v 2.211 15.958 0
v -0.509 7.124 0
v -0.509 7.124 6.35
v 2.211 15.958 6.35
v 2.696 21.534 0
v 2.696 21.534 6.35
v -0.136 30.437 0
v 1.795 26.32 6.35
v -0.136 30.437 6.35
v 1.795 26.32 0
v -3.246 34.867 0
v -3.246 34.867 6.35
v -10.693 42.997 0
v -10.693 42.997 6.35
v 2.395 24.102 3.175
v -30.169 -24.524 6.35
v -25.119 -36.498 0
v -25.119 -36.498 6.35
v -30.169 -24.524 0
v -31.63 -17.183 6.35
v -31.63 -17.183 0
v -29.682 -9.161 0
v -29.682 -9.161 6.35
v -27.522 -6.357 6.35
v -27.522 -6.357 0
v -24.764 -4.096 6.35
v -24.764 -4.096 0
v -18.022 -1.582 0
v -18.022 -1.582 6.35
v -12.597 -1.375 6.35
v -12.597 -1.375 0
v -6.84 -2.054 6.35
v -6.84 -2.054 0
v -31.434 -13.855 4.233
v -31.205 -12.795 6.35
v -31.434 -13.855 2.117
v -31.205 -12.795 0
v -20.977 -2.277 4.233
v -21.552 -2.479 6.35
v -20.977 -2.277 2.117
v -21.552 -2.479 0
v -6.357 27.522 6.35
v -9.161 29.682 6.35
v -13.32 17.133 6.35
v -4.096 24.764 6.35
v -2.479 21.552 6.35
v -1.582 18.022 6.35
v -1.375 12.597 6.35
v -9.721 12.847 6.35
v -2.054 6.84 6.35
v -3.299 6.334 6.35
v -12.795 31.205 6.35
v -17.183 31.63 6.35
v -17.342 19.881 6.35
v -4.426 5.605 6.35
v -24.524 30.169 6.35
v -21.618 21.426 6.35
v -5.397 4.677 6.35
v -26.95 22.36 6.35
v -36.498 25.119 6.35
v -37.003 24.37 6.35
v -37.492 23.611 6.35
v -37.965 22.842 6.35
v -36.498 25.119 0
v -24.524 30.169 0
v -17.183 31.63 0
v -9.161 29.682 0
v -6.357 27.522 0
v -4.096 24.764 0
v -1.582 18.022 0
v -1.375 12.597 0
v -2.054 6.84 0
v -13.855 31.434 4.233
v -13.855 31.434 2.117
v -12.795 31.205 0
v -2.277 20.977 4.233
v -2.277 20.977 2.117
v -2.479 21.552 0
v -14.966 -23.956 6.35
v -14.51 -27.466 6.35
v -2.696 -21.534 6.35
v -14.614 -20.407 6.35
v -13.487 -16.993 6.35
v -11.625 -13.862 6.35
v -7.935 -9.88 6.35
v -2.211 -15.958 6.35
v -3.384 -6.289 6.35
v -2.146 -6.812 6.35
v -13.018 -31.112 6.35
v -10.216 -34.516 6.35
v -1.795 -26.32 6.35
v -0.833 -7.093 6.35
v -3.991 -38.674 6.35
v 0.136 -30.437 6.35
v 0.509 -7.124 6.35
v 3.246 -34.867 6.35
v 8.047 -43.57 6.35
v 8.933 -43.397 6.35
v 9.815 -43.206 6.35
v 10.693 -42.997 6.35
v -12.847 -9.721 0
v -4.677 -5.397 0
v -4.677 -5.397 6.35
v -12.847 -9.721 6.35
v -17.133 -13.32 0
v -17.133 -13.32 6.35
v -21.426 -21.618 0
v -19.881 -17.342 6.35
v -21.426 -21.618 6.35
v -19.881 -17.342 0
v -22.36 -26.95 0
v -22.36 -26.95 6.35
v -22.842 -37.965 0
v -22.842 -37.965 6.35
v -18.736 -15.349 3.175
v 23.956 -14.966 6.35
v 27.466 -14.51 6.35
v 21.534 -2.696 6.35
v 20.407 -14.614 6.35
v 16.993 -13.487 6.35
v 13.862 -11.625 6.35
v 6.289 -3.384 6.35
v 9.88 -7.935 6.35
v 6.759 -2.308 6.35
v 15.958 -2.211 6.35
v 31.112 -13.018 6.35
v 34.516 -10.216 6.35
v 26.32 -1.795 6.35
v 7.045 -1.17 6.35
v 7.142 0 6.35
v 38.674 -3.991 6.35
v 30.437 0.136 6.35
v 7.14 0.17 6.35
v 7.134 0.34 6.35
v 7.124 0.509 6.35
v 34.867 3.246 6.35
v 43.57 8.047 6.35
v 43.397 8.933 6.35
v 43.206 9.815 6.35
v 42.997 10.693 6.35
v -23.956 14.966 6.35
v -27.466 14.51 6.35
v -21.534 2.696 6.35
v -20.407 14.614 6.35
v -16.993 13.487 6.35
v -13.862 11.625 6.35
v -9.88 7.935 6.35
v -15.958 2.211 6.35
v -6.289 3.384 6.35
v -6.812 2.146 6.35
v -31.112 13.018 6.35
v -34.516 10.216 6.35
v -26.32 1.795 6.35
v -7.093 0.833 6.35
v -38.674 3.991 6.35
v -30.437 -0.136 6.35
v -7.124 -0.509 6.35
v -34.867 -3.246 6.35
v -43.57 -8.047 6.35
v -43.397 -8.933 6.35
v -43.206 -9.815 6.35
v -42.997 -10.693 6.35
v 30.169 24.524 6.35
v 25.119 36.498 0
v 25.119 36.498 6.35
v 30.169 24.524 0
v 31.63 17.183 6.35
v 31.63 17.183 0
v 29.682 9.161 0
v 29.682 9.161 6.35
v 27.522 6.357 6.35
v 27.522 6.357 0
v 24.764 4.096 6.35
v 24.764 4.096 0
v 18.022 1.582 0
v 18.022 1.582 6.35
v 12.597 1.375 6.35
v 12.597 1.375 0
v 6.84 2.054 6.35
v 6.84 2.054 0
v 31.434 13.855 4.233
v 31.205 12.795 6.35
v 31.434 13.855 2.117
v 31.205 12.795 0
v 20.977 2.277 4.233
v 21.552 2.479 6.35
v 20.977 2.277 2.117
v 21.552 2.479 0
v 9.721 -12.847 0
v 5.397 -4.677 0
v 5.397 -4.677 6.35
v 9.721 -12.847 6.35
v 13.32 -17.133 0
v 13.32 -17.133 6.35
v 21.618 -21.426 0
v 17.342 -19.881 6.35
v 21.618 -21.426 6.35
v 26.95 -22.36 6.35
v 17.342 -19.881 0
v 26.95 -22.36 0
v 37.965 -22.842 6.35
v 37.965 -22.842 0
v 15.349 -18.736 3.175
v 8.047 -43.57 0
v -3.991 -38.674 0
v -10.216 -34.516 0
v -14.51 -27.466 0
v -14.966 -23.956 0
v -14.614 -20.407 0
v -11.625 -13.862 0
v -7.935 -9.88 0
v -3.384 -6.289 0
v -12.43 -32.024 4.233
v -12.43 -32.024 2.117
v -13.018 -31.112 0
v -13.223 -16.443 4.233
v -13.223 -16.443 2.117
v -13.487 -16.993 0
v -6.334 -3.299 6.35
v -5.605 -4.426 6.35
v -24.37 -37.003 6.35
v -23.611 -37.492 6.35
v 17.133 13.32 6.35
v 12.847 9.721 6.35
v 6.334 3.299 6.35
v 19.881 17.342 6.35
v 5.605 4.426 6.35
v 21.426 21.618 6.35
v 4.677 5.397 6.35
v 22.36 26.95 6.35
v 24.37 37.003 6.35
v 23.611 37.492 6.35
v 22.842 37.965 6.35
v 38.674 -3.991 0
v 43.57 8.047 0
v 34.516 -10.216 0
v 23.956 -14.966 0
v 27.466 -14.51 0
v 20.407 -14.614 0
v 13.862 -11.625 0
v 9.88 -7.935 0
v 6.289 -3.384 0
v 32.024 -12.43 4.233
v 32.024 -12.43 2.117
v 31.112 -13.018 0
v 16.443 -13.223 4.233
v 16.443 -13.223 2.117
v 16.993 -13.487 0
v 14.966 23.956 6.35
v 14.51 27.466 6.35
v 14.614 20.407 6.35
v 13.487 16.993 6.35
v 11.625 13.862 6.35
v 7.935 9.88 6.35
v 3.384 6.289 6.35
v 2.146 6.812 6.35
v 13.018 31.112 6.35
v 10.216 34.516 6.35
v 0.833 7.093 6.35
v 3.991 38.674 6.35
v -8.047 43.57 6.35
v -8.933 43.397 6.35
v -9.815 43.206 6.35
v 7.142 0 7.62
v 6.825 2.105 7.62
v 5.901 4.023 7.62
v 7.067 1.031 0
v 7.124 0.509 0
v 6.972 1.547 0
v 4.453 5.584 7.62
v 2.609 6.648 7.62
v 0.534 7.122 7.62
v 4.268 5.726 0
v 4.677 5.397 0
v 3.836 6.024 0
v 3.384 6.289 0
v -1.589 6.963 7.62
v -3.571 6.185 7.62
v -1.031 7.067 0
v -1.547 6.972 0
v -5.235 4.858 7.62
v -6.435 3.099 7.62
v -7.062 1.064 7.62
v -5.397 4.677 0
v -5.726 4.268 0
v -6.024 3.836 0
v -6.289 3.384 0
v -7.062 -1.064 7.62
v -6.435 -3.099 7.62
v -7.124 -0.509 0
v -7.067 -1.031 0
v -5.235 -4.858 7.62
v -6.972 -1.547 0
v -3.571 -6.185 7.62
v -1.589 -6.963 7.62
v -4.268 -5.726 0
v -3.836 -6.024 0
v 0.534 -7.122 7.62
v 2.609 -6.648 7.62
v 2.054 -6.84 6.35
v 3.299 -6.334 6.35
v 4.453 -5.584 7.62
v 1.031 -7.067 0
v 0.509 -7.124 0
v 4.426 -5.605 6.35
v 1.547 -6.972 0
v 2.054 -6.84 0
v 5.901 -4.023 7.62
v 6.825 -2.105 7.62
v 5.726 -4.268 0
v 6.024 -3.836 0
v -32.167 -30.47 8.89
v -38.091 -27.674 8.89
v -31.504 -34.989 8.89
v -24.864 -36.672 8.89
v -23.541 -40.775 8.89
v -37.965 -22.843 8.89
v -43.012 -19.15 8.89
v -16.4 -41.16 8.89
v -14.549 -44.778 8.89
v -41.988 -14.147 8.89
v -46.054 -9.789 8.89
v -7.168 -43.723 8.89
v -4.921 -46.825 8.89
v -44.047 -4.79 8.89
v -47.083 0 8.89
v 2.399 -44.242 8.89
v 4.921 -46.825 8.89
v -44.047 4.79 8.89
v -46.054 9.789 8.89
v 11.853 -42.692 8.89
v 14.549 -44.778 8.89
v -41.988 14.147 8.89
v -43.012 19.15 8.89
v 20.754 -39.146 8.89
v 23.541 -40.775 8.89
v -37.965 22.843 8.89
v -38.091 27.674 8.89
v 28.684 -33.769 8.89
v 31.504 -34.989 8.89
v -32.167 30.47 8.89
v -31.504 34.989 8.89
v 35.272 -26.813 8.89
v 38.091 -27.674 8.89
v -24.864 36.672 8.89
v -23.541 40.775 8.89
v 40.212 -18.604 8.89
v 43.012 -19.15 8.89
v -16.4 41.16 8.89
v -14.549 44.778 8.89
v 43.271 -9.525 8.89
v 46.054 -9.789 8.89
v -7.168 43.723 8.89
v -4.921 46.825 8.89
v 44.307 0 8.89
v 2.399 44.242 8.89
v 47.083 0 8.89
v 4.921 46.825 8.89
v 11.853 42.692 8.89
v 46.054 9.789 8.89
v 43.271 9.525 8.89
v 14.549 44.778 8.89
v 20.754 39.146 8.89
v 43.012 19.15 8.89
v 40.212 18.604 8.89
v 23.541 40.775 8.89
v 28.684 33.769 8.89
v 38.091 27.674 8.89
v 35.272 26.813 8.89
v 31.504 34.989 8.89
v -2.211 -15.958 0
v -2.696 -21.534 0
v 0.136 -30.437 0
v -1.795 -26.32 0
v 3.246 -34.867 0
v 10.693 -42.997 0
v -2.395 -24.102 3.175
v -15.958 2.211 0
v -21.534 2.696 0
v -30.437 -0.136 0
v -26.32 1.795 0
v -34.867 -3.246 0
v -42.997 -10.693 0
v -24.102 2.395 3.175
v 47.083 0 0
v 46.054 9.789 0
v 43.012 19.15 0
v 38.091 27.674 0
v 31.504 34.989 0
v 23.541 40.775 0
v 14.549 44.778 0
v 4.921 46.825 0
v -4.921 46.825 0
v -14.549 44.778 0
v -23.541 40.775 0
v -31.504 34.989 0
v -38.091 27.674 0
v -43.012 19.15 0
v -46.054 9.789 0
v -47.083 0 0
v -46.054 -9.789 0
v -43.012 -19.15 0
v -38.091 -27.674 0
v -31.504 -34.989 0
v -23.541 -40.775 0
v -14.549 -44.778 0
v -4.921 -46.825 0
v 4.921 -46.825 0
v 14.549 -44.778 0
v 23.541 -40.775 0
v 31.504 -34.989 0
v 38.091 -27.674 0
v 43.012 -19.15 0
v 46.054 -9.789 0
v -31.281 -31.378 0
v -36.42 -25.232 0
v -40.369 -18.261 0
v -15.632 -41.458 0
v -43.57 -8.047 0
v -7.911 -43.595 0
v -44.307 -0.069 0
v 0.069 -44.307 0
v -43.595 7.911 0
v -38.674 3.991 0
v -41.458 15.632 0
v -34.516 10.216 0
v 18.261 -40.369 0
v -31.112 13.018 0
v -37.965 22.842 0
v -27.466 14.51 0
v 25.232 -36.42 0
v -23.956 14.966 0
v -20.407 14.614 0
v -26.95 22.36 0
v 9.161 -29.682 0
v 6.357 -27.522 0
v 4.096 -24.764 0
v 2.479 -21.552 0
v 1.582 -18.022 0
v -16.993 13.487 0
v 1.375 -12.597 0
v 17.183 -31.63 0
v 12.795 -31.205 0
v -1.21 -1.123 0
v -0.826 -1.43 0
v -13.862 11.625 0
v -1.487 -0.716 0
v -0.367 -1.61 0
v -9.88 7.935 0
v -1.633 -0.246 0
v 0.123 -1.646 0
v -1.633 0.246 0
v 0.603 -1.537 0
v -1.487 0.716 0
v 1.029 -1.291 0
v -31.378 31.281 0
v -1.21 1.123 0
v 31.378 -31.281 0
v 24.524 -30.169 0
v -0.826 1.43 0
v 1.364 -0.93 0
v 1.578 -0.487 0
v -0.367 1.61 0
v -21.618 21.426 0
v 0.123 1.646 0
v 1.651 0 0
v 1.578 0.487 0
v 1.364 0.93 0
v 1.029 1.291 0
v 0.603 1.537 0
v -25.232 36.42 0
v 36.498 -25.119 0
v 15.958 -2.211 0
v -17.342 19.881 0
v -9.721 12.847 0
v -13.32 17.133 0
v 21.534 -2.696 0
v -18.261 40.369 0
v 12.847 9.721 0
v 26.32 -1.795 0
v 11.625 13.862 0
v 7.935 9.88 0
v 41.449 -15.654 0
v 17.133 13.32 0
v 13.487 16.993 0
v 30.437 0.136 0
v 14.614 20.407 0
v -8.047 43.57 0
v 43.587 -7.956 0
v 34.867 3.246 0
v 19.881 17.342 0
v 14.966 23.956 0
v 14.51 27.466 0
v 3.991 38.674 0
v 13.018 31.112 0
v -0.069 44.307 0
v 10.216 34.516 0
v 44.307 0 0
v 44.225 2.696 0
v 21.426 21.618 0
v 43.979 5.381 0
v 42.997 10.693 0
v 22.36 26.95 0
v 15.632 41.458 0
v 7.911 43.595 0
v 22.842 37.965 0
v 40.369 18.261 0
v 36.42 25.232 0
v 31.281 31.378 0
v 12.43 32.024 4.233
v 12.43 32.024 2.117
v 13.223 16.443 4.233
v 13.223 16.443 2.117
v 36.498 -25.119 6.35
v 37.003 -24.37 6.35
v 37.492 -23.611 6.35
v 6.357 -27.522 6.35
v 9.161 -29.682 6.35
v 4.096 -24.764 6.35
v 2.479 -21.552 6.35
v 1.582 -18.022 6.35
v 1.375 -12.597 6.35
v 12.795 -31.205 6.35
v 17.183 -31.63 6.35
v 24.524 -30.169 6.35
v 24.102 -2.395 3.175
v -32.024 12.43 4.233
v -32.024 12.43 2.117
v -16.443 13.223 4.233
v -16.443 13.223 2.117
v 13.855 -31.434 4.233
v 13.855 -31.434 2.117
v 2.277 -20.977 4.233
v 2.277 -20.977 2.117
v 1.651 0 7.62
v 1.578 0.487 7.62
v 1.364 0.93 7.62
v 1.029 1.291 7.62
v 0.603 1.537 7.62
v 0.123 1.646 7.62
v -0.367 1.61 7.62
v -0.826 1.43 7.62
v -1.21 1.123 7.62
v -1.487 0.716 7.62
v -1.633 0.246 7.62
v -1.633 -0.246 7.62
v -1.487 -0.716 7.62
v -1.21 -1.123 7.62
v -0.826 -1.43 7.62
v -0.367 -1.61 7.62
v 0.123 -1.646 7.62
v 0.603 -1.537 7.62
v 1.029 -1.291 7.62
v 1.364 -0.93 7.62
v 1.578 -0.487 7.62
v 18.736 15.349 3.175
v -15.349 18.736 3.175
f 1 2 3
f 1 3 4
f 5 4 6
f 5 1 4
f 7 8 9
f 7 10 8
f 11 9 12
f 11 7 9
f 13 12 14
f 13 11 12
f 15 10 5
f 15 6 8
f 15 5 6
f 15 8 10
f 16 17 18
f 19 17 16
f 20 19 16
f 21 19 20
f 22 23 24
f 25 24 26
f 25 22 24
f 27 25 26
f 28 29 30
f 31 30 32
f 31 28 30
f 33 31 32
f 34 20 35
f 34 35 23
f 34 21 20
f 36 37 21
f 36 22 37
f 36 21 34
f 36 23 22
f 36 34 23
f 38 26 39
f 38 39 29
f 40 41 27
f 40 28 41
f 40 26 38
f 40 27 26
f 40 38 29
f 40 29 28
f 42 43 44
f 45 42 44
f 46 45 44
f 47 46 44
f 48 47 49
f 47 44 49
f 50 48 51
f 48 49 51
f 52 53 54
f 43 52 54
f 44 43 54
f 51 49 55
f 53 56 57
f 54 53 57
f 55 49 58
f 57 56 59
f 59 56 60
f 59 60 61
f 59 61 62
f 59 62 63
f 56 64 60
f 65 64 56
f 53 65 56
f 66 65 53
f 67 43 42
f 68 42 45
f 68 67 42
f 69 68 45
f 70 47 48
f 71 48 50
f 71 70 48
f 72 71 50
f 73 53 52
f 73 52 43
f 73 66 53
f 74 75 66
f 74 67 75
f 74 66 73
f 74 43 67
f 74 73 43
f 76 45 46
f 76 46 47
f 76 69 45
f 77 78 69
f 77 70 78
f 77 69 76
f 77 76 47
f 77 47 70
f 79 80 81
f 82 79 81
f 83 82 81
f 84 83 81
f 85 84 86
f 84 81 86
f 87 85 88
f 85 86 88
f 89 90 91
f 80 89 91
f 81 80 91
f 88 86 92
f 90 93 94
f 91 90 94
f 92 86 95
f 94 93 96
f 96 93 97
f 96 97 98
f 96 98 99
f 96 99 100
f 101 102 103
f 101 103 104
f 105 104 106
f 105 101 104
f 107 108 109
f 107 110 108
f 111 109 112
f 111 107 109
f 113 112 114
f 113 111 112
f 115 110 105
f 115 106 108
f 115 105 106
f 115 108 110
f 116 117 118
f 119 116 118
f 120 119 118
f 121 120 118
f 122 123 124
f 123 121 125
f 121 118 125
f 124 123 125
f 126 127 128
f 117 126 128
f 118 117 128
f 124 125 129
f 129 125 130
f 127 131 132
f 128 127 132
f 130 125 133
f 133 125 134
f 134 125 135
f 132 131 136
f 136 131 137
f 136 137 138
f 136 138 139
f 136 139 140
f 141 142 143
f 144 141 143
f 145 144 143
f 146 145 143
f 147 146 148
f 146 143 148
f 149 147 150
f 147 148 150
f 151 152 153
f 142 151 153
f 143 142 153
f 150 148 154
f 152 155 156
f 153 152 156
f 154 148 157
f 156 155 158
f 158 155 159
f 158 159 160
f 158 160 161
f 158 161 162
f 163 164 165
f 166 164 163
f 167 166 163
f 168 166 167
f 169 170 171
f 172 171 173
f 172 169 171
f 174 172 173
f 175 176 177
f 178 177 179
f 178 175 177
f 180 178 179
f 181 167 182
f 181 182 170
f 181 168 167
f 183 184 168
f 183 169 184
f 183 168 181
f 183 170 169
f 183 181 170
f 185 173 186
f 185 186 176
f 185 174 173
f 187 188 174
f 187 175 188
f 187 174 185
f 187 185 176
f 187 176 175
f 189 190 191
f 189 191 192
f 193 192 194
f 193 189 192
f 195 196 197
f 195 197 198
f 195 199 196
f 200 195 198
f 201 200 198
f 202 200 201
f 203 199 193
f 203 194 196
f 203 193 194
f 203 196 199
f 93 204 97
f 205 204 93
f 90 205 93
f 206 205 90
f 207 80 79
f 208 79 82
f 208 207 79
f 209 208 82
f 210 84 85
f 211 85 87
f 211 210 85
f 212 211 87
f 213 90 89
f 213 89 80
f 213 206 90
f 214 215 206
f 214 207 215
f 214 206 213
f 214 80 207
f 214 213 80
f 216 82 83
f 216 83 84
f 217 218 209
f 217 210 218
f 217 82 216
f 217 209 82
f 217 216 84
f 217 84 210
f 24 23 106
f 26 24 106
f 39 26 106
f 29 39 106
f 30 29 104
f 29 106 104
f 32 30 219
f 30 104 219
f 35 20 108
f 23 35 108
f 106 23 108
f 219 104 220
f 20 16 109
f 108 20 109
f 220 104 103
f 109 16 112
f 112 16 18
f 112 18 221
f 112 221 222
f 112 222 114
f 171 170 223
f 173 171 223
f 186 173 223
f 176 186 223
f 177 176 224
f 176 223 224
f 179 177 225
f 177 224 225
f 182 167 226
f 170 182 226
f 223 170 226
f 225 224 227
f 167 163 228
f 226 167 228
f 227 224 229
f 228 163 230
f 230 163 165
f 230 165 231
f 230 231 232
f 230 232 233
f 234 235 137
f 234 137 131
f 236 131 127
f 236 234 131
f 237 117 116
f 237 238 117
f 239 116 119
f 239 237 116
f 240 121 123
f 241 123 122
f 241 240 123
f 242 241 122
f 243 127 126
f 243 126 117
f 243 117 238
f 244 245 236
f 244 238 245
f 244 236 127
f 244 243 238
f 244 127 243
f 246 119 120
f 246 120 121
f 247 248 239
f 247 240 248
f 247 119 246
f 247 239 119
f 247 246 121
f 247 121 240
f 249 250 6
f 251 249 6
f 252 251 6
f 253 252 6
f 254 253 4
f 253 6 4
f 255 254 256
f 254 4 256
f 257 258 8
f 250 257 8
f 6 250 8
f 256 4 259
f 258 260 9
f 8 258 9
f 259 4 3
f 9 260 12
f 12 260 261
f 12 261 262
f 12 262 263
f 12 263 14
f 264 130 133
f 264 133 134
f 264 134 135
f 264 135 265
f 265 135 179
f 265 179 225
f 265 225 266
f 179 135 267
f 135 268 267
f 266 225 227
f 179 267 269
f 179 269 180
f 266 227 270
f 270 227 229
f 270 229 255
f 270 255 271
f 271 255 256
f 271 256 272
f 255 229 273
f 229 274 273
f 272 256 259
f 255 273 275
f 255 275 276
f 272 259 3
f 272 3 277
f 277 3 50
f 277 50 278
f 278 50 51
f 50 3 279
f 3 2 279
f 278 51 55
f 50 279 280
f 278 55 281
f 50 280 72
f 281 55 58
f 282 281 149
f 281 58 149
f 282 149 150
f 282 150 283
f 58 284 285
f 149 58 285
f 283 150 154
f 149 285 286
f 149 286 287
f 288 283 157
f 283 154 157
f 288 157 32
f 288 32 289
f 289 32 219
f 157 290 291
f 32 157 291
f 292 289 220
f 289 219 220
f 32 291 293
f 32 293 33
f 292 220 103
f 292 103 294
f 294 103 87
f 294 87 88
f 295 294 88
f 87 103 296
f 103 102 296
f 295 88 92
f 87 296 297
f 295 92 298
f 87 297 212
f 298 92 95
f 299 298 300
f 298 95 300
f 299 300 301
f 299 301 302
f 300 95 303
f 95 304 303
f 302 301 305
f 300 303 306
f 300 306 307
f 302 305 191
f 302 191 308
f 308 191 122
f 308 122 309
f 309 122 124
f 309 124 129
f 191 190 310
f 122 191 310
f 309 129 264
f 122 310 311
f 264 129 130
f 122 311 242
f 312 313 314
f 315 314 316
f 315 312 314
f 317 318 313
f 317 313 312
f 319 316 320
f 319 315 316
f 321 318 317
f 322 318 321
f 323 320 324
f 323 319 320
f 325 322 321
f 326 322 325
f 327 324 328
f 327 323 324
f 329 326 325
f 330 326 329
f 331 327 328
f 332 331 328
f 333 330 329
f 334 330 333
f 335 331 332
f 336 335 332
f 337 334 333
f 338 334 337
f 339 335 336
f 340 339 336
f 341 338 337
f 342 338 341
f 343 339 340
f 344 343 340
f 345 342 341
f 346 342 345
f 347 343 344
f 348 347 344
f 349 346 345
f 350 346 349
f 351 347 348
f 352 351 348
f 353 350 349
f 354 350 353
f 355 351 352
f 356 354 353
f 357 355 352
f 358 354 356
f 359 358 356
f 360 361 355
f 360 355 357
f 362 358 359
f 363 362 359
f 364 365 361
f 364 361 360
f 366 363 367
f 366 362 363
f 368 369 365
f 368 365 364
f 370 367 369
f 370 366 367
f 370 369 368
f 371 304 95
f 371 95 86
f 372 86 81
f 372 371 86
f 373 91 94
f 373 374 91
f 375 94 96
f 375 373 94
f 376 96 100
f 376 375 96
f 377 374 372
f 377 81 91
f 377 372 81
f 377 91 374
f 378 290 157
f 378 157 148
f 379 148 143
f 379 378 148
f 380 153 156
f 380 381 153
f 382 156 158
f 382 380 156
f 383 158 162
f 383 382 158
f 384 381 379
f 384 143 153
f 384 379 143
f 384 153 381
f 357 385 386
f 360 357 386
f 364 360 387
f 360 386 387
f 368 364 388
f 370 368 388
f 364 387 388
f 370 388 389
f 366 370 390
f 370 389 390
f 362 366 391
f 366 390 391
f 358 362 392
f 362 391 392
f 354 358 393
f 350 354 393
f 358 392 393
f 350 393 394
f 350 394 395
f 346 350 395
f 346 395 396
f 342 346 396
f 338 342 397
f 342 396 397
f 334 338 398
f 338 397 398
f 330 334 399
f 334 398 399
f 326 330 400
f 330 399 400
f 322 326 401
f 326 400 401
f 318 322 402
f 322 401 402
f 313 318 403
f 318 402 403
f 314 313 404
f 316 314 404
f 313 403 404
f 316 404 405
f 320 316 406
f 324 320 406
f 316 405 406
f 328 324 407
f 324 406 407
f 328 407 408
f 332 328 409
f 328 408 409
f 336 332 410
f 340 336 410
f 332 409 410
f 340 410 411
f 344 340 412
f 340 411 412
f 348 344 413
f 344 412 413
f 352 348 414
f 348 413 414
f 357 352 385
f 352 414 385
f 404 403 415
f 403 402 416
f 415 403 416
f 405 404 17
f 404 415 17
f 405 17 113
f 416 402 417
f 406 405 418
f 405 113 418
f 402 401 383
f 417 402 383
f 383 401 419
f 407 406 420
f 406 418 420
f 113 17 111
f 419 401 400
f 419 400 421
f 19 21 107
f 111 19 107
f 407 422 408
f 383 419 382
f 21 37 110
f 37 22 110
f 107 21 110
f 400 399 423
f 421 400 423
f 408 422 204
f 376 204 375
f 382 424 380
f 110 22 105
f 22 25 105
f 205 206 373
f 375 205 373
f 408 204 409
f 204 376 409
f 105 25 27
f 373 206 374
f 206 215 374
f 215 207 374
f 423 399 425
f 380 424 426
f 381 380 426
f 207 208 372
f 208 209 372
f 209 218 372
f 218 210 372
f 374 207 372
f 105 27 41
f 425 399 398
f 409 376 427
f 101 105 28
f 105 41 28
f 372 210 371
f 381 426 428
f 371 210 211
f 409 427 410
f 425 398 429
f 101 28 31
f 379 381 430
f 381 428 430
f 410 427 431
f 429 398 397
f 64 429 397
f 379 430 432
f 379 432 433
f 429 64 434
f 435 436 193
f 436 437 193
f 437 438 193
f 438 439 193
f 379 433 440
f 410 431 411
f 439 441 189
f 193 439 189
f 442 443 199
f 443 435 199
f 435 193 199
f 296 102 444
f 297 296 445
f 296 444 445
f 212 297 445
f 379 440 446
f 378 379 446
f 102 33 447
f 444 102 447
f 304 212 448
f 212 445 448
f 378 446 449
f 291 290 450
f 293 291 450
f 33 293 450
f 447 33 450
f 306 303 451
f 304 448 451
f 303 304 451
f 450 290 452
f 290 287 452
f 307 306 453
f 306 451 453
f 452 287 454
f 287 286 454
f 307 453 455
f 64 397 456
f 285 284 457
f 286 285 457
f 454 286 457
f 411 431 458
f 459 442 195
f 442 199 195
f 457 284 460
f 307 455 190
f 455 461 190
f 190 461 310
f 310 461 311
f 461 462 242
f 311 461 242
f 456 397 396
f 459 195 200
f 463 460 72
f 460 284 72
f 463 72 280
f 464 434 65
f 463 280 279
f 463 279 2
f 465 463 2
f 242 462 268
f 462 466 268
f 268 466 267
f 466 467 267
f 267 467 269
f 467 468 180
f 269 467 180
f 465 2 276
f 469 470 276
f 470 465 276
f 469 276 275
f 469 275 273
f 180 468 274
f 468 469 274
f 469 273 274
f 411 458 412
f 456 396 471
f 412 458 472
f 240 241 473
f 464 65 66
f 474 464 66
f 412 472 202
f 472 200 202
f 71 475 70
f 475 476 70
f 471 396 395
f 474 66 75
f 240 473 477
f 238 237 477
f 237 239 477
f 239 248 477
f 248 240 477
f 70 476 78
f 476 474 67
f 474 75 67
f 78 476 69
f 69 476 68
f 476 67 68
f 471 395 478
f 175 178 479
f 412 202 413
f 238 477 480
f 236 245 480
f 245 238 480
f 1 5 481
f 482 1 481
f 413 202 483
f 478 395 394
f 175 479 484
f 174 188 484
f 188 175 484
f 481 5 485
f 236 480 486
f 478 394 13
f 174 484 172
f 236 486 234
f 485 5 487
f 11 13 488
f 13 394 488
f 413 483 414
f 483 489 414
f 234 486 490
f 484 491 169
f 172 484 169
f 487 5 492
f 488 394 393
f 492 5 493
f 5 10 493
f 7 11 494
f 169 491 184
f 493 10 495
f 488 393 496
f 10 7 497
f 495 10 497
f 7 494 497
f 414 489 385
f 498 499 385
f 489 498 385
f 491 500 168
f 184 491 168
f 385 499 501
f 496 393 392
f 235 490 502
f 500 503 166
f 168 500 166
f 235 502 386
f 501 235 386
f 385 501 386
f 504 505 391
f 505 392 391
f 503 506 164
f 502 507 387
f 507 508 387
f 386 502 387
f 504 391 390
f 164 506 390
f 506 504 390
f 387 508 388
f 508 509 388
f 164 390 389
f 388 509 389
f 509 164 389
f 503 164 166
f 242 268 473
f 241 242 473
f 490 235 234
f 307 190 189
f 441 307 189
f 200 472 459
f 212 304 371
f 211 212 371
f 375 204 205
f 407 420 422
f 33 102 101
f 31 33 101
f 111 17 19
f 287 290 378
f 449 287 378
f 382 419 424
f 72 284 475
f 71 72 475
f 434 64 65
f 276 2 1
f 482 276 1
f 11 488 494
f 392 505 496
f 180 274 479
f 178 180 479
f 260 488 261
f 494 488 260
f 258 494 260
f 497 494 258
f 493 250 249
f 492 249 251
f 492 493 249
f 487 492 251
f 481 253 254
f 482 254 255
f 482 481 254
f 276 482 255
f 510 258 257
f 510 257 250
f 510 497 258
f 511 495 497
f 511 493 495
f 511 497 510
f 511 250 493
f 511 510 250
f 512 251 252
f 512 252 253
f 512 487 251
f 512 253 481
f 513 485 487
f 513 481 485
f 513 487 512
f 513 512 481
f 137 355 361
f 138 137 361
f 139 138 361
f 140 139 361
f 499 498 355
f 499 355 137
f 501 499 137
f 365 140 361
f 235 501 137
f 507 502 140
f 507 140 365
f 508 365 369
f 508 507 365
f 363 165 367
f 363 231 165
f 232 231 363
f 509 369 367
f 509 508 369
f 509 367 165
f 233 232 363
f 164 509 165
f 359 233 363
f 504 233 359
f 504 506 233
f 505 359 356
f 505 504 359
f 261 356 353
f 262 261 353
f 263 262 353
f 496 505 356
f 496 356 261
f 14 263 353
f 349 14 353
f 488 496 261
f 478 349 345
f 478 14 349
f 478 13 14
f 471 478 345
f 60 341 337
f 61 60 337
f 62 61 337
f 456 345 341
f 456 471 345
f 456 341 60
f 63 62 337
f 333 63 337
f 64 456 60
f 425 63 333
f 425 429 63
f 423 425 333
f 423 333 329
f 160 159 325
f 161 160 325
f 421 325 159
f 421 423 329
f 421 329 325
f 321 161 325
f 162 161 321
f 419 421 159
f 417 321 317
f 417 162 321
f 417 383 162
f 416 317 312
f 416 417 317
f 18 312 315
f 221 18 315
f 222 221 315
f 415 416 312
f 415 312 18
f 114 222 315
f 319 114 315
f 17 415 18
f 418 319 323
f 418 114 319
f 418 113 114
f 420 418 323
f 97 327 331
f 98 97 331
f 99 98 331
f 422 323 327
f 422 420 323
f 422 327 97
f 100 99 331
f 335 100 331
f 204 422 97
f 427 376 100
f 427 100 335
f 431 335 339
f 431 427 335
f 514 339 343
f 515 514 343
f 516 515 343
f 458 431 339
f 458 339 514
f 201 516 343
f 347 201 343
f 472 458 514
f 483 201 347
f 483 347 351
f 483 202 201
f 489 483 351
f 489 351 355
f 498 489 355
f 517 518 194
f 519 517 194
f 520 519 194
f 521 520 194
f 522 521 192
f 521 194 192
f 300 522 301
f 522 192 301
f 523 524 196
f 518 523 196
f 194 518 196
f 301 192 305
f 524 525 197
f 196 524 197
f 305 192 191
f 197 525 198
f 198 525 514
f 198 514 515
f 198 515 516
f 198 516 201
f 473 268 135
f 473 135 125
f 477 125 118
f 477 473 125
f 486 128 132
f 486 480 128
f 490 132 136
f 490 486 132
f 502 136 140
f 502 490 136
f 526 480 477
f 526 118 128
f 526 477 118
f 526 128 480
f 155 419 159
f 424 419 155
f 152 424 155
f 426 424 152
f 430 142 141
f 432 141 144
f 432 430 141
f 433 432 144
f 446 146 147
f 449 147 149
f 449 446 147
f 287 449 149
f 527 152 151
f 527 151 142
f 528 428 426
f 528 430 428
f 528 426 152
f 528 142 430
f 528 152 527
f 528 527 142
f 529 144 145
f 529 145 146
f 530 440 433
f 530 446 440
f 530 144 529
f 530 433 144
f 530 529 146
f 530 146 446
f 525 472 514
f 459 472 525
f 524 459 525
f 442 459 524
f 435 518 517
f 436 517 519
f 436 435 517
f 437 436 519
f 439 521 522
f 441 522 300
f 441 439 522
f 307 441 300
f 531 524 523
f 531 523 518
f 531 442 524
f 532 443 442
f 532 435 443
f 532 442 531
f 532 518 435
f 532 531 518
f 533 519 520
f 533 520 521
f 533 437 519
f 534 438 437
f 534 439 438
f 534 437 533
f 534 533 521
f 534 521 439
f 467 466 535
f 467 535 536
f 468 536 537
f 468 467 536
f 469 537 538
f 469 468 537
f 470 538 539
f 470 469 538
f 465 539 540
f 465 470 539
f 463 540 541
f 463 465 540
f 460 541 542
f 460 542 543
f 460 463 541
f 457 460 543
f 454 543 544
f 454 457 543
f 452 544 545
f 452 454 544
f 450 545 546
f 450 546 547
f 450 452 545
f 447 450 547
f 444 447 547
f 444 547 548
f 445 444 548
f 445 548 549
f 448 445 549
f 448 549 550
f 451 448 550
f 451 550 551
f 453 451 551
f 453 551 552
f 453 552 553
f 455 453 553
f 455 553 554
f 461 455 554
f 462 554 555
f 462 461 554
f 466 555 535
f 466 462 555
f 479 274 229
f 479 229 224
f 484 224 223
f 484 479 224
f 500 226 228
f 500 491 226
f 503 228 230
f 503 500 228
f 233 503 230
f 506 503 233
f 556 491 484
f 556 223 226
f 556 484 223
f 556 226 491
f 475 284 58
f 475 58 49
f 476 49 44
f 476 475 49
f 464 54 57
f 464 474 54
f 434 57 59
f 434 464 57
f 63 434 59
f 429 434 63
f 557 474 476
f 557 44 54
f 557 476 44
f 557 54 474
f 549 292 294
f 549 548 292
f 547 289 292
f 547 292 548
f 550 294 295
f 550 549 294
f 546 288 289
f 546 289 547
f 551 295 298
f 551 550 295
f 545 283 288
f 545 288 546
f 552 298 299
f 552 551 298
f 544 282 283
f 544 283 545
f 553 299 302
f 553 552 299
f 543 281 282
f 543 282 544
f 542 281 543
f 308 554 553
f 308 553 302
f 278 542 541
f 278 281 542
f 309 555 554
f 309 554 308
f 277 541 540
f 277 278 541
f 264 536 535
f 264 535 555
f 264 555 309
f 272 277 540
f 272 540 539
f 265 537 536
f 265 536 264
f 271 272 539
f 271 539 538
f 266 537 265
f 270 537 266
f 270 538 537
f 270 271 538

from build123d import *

# Parameters (mm, degrees)
F1_DEPTH = 6.35
F3_COUNT = 8
F4_R     = 47.0825039729
F4_R_2   = 44.3068303906
F5_DEPTH = 8.89
F6_R     = 7.1417908763
F6_R_2   = 1.651
F7_DEPTH = 7.62


with BuildPart() as f1:
    # F0 (on Top) → F1 (new body)
    with BuildSketch(Plane.XY):
        with BuildLine():
            add(Edge.make_bspline(
                [(0, 3.3976645209), (7.4587884053, 6.5259501827), (22.5301517256, 12.8470210078), (22.7388737657, 29.6453608255), (22.844299674, 38.1302349269)],
                knots=[0, 0, 0, 0, 0.4948980558, 1, 1, 1, 1], degree=3))
            add(Edge.make_bspline(
                [(24.3381727487, 38.1302349269), (28.4900980885, 29.4641772404), (35.902941466, 13.991806455), (21.2929500045, -1.0839801467), (7.440462338, 1.8316293611), (0, 3.3976645209)],
                knots=[0, 0, 0, 0, 0.3708140201, 0.6620509832, 1, 1, 1, 1], degree=3))
            Line((24.3381727487, 38.1302349269), (22.844299674, 38.1302349269))
        make_face()
    extrude(amount=F1_DEPTH)


with BuildPart() as f3_1:
    # F3: instance of F1
    add(f1.part.rotate(Axis((0, 0, 23.2516843826), (0, 0, 1)), 1 * 360 / F3_COUNT))


with BuildPart() as f3_2:
    # F3: instance of F1
    add(f1.part.rotate(Axis((0, 0, 23.2516843826), (0, 0, 1)), 2 * 360 / F3_COUNT))


with BuildPart() as f3_3:
    # F3: instance of F1
    add(f1.part.rotate(Axis((0, 0, 23.2516843826), (0, 0, 1)), 3 * 360 / F3_COUNT))


with BuildPart() as f3_4:
    # F3: instance of F1
    add(f1.part.rotate(Axis((0, 0, 23.2516843826), (0, 0, 1)), 4 * 360 / F3_COUNT))


with BuildPart() as f3_5:
    # F3: instance of F1
    add(f1.part.rotate(Axis((0, 0, 23.2516843826), (0, 0, 1)), 5 * 360 / F3_COUNT))


with BuildPart() as f3_6:
    # F3: instance of F1
    add(f1.part.rotate(Axis((0, 0, 23.2516843826), (0, 0, 1)), 6 * 360 / F3_COUNT))


with BuildPart() as f3_7:
    # F3: instance of F1
    add(f1.part.rotate(Axis((0, 0, 23.2516843826), (0, 0, 1)), 7 * 360 / F3_COUNT))


with BuildPart() as f1_1:
    add(f1.part)

    add(f3_1.part)  # F5 merges F3_1

    add(f3_2.part)  # F5 merges F3_2

    add(f3_3.part)  # F5 merges F3_3

    add(f3_4.part)  # F5 merges F3_4

    add(f3_5.part)  # F5 merges F3_5

    add(f3_6.part)  # F5 merges F3_6

    add(f3_7.part)  # F5 merges F3_7
    # F4 (on Top) → F5 (join)
    with BuildSketch(Plane.XY):
        Circle(F4_R)
        Circle(F4_R_2, mode=Mode.SUBTRACT)
    extrude(amount=F5_DEPTH)

    # F6 (on Top) → F7 (join)
    with BuildSketch(Plane.XY):
        Circle(F6_R)
        Circle(F6_R_2, mode=Mode.SUBTRACT)
    extrude(amount=F7_DEPTH)


solid = f1_1.part
